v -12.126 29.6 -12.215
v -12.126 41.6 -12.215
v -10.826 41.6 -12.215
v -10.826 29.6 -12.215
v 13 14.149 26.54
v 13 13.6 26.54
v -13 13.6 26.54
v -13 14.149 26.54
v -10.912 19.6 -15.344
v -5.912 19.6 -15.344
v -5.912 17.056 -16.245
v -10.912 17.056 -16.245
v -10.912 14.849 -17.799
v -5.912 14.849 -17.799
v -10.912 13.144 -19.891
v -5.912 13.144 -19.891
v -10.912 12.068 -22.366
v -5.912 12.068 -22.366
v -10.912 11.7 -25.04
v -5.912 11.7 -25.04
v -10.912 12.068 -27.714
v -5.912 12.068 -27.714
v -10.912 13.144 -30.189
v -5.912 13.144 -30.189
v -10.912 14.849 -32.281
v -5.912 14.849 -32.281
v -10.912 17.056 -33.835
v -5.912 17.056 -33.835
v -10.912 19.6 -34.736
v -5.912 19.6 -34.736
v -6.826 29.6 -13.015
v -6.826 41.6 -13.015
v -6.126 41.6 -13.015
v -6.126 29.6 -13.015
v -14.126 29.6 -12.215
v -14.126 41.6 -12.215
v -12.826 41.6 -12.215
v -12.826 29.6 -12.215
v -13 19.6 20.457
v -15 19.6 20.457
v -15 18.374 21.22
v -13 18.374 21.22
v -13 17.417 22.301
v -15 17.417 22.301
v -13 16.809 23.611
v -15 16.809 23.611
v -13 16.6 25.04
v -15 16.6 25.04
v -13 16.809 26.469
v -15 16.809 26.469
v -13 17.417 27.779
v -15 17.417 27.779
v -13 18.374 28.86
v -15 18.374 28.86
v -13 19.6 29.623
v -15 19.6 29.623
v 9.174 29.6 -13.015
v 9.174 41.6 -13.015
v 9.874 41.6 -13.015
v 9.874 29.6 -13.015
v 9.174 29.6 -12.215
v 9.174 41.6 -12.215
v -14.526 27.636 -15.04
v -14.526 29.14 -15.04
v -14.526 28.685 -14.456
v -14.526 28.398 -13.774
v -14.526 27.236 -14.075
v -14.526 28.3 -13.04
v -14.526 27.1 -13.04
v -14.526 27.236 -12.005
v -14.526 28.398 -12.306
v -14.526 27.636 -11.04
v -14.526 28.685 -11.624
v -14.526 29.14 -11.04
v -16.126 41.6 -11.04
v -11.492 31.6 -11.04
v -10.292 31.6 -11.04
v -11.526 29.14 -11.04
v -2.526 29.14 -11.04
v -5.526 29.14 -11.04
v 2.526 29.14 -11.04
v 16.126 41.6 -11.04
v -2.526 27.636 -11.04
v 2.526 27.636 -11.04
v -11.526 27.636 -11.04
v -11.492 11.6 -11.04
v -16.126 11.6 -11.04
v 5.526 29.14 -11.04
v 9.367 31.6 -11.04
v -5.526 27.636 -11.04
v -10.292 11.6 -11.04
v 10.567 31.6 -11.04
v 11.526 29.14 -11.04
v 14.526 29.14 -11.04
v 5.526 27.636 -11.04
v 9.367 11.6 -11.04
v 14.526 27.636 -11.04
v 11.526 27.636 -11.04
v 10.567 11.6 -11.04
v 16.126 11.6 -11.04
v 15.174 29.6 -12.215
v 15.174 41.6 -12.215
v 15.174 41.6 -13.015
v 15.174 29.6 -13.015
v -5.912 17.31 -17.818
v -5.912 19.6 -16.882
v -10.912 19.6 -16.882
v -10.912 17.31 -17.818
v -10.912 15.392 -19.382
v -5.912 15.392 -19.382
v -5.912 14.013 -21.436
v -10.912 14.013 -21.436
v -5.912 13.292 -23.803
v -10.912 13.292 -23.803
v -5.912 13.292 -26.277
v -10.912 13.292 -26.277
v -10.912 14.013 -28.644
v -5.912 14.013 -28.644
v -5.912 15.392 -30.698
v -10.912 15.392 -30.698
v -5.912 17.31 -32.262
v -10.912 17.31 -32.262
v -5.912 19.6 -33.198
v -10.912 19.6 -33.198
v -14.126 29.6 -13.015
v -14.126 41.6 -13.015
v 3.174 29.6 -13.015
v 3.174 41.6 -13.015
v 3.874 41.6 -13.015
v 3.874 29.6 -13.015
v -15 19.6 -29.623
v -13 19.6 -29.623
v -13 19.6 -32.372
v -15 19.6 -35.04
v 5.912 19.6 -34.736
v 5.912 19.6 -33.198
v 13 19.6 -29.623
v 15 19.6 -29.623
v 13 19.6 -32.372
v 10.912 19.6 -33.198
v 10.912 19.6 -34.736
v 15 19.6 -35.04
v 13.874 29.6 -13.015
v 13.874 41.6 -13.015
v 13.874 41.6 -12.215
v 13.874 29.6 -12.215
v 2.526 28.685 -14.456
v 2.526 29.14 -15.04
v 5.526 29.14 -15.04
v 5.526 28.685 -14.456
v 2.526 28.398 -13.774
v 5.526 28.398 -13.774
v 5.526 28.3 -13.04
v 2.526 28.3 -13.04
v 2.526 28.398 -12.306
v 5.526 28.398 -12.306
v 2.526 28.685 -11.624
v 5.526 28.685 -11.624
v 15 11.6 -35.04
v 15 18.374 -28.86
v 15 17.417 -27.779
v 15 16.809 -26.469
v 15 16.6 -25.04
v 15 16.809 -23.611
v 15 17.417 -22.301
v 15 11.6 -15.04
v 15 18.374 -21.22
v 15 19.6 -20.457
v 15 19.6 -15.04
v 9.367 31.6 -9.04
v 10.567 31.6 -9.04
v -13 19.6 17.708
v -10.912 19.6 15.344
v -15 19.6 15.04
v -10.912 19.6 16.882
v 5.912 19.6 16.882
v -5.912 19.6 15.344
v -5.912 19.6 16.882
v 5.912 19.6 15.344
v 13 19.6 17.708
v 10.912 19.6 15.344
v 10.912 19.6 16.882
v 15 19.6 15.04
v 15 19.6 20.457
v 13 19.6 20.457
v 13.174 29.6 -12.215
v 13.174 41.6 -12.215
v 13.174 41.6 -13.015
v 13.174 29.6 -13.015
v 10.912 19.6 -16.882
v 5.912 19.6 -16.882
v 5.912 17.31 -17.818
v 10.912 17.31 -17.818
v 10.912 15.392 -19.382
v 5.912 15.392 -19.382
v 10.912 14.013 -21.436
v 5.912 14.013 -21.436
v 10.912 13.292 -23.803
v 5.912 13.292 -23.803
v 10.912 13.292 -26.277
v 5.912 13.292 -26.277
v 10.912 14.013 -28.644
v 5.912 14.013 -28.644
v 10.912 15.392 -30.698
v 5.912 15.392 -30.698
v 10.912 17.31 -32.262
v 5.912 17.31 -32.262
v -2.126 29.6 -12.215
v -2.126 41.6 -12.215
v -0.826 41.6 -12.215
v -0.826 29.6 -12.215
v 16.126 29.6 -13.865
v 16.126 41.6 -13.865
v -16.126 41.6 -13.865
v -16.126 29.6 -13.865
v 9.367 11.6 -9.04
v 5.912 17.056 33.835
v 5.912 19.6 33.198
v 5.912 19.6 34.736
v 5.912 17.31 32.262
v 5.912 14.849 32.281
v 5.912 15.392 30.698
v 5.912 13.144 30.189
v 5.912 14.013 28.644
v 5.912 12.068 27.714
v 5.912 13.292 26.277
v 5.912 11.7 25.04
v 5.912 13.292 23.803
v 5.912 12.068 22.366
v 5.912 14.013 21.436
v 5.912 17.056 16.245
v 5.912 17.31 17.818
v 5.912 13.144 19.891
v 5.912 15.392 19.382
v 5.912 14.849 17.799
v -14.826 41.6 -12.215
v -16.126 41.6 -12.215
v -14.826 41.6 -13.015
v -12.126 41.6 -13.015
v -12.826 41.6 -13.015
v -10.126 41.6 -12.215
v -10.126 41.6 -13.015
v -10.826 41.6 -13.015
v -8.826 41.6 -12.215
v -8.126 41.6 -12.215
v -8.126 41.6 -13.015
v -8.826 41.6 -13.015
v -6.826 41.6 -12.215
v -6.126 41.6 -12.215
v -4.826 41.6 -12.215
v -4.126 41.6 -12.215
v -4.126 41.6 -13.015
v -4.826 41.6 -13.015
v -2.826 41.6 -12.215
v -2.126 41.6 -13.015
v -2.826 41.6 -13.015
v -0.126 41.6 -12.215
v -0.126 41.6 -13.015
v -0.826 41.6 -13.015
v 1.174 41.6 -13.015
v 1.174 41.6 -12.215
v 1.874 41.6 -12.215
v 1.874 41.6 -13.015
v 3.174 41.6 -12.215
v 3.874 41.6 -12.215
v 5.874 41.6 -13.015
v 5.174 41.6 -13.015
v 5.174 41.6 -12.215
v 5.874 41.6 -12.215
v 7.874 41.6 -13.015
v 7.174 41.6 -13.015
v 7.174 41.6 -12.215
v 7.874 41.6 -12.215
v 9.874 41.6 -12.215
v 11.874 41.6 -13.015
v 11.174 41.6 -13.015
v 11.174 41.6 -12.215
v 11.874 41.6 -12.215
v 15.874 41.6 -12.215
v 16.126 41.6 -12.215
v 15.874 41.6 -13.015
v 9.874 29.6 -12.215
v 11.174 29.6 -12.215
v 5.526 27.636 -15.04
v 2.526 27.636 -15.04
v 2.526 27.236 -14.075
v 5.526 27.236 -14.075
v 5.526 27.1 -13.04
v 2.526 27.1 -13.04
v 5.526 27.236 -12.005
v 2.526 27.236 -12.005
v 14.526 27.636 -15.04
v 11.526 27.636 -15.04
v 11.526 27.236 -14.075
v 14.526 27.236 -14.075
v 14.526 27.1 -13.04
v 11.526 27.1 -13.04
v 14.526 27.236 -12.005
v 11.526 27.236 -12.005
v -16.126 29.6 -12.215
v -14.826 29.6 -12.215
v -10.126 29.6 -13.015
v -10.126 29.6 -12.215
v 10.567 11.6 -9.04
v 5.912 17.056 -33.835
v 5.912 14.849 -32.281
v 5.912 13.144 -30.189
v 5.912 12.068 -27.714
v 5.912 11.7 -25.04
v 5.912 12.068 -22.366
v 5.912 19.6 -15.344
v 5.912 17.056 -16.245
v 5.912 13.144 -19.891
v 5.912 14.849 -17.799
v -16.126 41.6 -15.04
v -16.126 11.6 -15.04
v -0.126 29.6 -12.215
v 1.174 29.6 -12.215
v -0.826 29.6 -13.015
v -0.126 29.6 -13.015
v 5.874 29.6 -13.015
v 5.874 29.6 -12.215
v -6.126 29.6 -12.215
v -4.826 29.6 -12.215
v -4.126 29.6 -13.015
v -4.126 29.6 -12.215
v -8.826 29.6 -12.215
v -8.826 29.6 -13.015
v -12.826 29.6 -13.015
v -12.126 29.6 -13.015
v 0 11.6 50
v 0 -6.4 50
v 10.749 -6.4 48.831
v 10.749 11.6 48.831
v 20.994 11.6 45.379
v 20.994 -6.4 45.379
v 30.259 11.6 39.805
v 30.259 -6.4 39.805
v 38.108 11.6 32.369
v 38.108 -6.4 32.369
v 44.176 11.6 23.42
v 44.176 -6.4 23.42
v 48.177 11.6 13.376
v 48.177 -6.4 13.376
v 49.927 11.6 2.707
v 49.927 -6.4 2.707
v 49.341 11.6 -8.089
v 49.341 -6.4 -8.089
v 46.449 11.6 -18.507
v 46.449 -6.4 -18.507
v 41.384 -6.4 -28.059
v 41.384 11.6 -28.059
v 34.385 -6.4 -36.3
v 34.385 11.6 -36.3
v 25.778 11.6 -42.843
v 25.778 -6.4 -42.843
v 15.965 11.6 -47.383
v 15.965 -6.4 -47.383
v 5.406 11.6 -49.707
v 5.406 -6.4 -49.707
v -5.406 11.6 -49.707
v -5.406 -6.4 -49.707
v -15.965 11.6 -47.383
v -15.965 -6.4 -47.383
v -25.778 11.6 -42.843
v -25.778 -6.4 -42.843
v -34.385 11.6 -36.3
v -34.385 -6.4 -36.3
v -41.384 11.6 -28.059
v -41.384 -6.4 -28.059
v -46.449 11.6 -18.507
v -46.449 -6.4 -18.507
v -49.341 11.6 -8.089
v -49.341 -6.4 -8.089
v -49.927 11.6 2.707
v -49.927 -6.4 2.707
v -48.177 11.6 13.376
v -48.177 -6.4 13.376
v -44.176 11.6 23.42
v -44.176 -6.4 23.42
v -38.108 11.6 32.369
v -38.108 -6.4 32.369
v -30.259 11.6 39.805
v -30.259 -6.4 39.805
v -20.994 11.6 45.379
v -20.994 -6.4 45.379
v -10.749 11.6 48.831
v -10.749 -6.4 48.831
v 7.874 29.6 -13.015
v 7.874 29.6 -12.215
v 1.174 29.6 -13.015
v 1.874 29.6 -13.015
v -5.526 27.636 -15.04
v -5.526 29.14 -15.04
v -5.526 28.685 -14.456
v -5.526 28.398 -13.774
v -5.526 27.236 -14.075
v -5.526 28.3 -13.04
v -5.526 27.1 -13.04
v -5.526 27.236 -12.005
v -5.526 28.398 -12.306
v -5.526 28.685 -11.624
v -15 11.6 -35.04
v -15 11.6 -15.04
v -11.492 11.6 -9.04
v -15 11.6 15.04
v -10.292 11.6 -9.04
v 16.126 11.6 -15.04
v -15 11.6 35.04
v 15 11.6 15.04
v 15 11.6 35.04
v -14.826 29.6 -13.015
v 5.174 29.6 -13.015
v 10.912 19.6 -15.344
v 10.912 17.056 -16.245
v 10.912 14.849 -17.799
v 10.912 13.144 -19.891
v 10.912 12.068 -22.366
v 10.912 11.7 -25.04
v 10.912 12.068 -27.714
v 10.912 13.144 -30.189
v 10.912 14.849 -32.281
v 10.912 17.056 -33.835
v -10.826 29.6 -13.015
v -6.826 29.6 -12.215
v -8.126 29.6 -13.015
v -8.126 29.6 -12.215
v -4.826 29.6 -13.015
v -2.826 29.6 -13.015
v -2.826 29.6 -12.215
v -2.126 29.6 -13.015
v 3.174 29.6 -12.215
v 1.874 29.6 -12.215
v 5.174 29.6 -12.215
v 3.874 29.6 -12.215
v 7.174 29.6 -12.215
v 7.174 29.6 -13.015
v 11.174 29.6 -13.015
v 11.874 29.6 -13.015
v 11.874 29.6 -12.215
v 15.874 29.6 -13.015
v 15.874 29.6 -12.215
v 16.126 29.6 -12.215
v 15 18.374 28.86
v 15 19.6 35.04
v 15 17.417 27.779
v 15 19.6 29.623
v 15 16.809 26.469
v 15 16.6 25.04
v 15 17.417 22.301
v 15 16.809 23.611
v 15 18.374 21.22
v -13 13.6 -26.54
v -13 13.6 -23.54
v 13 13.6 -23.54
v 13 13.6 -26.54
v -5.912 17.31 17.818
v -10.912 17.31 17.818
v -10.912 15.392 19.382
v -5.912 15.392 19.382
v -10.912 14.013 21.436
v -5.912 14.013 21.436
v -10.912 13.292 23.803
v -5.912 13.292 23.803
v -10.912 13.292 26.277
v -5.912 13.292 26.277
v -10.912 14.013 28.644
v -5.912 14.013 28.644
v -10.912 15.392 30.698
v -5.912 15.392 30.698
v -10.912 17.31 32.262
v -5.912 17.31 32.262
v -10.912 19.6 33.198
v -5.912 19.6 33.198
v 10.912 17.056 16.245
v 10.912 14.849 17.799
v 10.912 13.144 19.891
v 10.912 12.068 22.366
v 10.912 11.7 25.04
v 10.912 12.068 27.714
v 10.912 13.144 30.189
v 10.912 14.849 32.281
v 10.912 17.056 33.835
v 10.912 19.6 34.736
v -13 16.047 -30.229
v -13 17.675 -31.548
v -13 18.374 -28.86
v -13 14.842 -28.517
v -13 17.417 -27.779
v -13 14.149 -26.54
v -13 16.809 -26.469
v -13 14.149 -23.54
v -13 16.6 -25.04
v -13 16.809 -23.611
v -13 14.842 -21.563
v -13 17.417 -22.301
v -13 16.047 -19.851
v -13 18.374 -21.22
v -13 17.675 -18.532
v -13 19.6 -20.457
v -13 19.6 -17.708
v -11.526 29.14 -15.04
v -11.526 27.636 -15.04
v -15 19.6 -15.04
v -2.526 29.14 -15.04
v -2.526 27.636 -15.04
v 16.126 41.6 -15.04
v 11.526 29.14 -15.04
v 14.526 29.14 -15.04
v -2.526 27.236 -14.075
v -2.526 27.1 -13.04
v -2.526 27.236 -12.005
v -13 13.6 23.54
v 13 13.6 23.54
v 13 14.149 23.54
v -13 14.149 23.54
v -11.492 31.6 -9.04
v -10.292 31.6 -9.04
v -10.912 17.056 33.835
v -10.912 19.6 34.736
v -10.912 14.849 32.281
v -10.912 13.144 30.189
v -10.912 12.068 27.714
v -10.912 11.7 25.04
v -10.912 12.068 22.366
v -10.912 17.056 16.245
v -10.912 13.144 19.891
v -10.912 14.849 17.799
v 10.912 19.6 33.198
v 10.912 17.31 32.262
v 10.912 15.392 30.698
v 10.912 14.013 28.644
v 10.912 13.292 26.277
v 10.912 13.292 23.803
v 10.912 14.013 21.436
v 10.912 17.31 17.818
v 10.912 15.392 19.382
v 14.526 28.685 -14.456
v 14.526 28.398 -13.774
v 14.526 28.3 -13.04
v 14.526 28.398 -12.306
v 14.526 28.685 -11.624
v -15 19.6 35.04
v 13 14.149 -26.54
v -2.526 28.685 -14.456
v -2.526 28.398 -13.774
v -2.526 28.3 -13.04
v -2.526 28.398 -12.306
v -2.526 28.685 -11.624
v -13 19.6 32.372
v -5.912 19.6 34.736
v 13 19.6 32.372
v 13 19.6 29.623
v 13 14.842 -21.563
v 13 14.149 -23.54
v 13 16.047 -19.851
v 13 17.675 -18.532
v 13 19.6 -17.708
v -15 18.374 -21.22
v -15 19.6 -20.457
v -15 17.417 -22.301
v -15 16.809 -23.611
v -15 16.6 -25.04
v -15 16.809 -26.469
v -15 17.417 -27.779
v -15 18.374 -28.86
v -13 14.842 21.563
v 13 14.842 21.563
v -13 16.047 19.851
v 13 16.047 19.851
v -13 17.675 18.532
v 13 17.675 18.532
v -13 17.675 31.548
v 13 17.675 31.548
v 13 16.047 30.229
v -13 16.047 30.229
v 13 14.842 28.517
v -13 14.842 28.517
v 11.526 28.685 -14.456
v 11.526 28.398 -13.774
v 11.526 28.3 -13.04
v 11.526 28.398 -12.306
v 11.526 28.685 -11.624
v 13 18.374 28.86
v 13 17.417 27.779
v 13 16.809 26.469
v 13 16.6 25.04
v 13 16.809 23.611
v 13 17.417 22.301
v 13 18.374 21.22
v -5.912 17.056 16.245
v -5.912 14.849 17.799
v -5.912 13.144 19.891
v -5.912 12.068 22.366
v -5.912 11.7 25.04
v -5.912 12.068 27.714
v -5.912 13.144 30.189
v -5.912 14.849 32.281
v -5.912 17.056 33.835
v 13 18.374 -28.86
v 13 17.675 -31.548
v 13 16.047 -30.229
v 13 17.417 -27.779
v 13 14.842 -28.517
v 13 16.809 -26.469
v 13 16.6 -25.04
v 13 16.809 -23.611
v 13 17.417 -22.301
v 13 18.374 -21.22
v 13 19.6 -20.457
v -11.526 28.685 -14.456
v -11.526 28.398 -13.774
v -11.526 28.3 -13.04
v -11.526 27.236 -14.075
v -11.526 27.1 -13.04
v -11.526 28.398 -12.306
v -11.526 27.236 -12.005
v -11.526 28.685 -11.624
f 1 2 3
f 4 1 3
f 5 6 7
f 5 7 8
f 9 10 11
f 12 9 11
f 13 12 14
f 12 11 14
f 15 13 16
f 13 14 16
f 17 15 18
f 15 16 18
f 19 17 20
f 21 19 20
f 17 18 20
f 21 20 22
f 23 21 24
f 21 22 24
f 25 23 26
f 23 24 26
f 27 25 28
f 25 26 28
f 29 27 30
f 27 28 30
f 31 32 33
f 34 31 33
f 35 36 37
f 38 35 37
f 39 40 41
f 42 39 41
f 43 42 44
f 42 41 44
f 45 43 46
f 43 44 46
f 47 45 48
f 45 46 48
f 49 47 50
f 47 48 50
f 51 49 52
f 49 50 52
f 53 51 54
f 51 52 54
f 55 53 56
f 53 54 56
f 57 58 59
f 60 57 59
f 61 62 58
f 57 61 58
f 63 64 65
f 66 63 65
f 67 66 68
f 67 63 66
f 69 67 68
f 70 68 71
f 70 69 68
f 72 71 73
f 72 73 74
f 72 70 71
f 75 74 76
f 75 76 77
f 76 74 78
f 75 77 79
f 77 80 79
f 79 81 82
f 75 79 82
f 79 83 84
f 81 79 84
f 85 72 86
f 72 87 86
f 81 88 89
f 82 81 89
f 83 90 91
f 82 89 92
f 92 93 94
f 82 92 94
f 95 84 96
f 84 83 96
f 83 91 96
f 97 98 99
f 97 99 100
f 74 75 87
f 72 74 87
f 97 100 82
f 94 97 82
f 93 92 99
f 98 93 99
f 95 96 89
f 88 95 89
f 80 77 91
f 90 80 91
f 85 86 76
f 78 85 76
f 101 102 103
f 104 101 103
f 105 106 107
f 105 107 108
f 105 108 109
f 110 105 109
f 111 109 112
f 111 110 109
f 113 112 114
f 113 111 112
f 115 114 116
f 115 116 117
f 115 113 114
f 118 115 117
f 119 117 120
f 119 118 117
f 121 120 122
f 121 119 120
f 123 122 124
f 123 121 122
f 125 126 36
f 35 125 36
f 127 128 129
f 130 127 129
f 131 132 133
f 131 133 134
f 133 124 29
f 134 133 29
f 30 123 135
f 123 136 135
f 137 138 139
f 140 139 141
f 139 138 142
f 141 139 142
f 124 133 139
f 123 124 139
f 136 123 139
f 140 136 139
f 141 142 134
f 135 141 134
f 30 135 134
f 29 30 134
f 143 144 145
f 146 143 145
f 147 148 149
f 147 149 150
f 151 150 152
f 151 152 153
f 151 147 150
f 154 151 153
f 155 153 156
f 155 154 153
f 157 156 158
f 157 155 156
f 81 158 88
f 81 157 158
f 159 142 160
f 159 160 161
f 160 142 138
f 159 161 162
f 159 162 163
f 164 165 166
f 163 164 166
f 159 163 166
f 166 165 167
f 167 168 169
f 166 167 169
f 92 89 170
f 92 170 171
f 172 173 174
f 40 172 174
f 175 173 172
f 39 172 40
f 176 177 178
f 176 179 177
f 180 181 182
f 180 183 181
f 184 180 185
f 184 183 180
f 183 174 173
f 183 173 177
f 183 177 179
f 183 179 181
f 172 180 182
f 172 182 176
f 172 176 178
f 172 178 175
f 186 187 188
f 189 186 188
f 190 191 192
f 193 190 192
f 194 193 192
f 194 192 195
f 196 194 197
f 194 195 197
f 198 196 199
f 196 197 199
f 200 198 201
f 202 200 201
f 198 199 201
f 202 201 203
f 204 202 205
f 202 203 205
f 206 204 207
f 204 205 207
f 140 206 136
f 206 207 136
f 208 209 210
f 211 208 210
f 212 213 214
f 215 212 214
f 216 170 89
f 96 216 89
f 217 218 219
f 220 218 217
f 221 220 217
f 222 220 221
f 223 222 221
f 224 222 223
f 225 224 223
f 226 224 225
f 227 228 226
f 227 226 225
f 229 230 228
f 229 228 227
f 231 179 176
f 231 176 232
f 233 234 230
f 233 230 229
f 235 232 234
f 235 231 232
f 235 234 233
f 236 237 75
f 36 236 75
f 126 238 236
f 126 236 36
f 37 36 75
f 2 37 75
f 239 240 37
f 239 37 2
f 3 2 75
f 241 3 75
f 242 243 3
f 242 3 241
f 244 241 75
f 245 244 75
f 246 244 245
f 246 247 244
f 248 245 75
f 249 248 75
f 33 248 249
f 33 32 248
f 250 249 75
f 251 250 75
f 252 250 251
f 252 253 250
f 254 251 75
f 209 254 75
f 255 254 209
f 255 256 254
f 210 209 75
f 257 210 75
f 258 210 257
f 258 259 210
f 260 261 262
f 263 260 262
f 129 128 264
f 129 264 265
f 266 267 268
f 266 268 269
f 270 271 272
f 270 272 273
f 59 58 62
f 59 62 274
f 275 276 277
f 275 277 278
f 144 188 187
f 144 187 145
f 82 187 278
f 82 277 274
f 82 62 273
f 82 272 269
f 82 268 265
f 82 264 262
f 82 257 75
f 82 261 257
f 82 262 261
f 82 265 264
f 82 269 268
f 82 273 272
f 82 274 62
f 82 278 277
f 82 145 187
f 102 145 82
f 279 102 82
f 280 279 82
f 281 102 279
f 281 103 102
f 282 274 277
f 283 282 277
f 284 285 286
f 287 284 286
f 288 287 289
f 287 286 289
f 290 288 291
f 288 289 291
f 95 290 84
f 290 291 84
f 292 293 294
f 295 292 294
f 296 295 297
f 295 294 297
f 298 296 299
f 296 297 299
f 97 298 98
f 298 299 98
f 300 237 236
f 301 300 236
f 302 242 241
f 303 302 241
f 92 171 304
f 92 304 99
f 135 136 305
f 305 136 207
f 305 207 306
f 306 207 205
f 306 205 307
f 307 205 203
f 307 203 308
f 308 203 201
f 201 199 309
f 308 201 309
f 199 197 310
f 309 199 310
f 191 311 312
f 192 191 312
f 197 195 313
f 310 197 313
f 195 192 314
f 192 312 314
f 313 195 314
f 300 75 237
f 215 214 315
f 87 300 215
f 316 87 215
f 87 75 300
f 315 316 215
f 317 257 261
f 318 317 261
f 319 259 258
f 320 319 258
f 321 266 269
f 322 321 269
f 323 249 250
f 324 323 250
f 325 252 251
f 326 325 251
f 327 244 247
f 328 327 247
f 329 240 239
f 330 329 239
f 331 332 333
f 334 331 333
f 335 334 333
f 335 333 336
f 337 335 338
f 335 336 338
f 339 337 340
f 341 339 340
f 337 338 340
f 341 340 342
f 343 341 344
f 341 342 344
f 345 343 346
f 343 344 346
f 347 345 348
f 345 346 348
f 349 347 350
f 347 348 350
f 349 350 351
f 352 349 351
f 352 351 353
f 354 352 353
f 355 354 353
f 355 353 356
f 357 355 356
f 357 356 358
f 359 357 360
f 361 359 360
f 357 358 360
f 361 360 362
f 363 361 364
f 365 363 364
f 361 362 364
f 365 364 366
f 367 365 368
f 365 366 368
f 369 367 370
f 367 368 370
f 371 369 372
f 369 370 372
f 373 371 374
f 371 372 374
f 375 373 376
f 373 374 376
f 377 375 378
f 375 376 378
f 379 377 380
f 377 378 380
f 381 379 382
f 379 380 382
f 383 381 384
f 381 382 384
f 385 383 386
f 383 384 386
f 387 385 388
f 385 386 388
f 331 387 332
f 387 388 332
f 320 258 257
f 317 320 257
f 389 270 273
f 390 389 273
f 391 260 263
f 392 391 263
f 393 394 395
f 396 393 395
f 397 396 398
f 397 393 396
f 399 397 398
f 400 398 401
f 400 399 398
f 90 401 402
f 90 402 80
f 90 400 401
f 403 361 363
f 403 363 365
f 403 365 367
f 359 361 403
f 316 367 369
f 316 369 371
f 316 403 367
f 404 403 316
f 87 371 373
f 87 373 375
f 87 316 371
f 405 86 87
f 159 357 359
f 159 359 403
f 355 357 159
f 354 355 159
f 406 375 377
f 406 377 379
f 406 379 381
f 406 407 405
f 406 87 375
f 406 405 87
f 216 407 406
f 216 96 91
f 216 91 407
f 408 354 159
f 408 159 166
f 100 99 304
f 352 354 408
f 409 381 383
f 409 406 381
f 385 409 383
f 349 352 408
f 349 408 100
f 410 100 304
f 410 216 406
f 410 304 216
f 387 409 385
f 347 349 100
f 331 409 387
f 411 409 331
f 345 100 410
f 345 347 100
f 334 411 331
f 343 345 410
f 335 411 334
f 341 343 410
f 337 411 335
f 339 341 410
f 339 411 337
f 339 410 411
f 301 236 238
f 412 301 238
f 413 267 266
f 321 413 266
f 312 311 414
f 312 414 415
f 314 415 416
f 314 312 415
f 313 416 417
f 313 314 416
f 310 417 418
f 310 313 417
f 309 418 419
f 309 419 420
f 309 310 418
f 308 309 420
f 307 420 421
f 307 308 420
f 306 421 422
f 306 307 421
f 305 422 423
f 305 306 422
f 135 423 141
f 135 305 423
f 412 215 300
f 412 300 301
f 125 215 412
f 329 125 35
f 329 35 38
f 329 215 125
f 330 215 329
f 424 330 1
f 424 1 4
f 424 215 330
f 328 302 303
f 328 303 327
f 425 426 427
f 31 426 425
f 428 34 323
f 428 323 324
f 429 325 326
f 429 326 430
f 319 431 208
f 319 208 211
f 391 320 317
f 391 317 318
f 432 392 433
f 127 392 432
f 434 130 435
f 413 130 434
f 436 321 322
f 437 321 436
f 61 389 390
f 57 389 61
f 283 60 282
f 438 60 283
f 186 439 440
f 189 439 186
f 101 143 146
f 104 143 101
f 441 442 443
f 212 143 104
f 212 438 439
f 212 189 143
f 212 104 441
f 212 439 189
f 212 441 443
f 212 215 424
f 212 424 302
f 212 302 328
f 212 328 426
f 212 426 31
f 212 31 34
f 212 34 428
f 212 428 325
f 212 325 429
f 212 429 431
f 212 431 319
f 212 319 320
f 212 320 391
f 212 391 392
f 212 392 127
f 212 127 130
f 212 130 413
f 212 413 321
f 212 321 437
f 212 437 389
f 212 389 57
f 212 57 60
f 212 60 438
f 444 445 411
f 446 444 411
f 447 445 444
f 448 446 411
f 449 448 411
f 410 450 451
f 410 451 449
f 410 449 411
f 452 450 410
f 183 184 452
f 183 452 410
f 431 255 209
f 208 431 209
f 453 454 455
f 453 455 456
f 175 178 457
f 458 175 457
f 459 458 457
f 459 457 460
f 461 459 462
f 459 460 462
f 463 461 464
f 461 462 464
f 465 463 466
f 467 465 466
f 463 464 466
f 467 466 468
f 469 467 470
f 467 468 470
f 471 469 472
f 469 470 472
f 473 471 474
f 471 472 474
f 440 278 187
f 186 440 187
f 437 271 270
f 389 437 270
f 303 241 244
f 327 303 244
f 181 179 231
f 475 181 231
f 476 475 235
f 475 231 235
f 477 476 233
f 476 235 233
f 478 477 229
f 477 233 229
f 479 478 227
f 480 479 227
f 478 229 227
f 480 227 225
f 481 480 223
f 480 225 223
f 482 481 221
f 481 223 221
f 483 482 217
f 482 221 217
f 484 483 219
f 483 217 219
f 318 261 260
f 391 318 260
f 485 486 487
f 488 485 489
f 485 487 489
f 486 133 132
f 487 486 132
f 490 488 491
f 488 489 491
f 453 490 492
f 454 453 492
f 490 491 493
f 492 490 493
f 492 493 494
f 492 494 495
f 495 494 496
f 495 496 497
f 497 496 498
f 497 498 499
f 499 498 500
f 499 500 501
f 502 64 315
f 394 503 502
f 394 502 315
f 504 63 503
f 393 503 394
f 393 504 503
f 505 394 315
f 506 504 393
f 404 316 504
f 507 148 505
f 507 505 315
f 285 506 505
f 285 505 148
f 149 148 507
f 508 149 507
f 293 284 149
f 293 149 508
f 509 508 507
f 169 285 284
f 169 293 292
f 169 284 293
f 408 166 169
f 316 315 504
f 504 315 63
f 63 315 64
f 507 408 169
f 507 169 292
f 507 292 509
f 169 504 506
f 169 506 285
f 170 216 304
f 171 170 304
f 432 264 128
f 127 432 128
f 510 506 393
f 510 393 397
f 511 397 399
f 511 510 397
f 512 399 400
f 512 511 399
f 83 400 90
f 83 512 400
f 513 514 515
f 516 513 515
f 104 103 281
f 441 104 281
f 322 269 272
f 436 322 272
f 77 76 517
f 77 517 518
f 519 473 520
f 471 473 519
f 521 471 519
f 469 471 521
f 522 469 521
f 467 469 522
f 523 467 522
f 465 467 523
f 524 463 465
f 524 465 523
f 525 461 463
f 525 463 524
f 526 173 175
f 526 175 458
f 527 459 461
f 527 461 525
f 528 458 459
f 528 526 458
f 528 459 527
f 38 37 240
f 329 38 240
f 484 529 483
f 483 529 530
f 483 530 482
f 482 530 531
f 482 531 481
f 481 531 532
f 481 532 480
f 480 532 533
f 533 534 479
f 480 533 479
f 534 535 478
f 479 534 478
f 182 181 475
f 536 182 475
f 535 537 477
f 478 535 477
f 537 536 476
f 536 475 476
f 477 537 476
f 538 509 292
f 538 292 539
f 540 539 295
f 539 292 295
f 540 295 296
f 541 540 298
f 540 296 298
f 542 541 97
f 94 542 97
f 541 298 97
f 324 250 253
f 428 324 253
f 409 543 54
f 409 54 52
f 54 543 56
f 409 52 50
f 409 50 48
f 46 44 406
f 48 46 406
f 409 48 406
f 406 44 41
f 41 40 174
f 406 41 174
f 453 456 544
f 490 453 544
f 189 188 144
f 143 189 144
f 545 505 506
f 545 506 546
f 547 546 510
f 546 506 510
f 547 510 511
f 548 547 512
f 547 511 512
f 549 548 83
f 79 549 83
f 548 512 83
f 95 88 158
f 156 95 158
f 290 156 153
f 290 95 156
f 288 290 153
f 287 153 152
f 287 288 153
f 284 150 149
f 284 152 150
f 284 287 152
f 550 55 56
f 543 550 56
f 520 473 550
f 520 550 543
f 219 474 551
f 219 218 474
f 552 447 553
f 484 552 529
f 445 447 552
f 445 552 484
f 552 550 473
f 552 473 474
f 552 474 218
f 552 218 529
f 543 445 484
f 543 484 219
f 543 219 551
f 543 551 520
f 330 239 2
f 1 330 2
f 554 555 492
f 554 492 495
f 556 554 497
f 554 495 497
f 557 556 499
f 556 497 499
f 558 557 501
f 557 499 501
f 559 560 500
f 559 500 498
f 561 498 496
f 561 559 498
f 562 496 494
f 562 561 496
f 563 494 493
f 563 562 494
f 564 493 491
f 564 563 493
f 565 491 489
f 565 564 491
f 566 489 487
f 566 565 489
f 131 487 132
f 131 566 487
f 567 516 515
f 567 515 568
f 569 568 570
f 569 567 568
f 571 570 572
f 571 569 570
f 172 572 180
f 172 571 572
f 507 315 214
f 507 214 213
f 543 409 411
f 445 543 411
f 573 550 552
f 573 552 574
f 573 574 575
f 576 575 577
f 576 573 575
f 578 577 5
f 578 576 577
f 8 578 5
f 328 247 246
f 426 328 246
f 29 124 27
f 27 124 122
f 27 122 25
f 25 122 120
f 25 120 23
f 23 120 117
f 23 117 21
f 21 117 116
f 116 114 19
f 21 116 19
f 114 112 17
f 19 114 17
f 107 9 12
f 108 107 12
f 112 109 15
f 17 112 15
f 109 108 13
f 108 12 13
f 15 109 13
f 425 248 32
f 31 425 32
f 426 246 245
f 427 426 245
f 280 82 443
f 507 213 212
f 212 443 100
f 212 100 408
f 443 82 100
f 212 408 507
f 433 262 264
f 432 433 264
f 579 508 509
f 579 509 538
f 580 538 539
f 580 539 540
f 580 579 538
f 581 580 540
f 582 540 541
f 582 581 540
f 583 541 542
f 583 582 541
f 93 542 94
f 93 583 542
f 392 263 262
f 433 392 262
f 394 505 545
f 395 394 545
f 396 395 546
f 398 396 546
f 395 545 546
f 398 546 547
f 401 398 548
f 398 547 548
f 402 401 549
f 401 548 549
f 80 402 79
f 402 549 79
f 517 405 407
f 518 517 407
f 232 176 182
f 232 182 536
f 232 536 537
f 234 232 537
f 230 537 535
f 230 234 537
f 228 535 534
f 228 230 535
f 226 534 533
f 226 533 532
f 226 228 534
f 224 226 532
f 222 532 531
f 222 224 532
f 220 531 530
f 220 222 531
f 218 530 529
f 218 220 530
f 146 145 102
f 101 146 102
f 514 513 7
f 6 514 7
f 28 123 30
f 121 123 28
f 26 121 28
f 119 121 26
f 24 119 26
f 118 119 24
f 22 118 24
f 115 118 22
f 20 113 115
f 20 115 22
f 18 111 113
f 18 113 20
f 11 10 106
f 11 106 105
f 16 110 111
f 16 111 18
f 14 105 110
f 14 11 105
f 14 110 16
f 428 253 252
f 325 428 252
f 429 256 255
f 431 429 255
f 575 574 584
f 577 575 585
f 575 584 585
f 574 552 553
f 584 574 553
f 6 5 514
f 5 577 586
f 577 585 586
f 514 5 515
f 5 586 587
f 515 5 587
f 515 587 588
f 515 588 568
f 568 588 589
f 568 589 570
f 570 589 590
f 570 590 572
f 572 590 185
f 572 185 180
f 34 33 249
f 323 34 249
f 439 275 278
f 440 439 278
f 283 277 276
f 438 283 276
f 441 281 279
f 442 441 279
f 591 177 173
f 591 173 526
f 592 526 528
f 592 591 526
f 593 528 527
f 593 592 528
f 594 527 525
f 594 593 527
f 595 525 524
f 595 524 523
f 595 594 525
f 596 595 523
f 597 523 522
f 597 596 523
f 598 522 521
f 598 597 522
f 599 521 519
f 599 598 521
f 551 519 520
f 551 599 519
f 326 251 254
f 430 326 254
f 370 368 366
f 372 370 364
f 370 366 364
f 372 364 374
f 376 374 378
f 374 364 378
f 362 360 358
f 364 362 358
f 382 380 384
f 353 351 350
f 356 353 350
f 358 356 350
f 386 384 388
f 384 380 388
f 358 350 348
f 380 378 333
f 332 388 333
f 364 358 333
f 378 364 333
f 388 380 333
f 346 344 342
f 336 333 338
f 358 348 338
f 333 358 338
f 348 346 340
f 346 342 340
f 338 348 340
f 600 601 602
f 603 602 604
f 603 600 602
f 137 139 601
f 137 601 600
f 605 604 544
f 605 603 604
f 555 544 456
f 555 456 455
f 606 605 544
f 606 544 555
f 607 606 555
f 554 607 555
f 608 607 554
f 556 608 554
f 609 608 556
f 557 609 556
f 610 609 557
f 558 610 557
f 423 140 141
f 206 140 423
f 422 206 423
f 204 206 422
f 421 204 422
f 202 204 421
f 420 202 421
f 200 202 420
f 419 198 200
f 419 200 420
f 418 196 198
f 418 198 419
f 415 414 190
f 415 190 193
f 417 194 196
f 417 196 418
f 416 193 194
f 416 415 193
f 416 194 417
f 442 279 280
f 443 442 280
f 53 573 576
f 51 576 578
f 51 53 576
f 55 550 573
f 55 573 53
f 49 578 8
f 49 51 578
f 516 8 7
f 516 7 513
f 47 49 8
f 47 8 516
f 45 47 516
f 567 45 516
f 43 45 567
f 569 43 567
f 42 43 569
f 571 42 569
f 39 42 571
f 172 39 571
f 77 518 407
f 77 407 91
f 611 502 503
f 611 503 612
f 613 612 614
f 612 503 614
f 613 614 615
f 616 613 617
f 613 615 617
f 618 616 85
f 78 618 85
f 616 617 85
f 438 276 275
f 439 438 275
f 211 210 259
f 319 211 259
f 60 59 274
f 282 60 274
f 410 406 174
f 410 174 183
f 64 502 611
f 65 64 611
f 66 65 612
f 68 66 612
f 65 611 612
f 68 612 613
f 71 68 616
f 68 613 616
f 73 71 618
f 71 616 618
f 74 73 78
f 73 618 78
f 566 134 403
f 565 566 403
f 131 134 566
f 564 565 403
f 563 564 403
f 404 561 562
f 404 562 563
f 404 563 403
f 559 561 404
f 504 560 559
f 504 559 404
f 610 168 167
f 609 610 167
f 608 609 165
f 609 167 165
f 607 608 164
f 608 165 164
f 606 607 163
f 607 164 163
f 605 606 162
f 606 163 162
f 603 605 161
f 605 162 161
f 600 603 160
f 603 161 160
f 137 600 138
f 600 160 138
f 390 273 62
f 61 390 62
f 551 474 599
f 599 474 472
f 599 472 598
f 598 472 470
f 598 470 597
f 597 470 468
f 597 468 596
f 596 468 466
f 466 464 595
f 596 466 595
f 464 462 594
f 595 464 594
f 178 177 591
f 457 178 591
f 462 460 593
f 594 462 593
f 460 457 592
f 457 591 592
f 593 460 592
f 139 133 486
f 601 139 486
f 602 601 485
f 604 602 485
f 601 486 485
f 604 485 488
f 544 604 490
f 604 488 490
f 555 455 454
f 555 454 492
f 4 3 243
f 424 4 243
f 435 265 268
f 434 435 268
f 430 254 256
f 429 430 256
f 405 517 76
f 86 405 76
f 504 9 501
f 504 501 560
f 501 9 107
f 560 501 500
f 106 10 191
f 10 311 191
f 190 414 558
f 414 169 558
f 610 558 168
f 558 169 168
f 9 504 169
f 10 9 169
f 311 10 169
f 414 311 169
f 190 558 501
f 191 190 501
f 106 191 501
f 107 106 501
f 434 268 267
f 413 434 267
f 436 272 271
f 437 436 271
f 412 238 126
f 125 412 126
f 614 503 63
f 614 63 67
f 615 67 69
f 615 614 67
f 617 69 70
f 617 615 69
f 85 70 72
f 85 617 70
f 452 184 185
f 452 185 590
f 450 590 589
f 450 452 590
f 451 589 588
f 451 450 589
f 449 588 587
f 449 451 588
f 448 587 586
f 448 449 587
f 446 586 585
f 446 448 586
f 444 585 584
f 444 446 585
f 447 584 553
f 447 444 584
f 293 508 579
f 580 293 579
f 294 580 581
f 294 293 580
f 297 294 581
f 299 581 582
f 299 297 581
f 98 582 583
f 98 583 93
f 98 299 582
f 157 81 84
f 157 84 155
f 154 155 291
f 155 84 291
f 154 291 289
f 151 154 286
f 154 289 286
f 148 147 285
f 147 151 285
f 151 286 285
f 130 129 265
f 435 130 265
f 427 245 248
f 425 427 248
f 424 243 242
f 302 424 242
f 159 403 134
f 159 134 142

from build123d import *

# Parameters (mm, degrees)
AUFSATZ_LINEAR_AUSTRAGEN1_DEPTH      = 1.6
AUFSATZ_LINEAR_AUSTRAGEN1_DEPTH_BACK = 16.4
SKIZZE1_R                            = 50
SKIZZE2_W                            = 30
SKIZZE2_H                            = 20
AUFSATZ_LINEAR_AUSTRAGEN2_DEPTH      = 8
SKIZZE4_R                            = 7.6
SCHNITT_LINEAR_AUSTRAGEN1_DEPTH      = 85.315834812
AUFSATZ_LINEAR_AUSTRAGEN3_DEPTH      = 2
SKIZZE7_W                            = 3
SKIZZE7_H                            = 0.8
SCHNITT_LINEAR_AUSTRAGEN2_DEPTH      = 13
SKIZZE6_W                            = 5
SKIZZE6_H                            = 1.5
SPIEGELN3_COPY_1_DEPTH               = 2
SPIEGELN3_COPY_2_SKETCH_W            = 5
SPIEGELN3_COPY_2_SKETCH_H            = 1.5
SKIZZE9_W                            = 32.252572888
SKIZZE9_H                            = 4
AUFSATZ_LINEAR_AUSTRAGEN4_DEPTH      = 30
SCHNITT_LINEAR_AUSTRAGEN3_DEPTH      = 12
SKIZZE11_W                           = 1.2
SKIZZE11_H                           = 2
AUFSATZ_LINEAR_AUSTRAGEN5_DEPTH      = 20
SKIZZE13_W                           = 3
SKIZZE13_H                           = 1.2
SCHNITT_ROTATION3_ANGLE              = 180
LINEARES_MUSTER1_COUNT               = 2
LINEARES_MUSTER1_PITCH               = 9
SPIEGELN4_COPY_1_SKETCH_W            = 3
SPIEGELN4_COPY_1_SKETCH_H            = 1.2
SPIEGELN4_COPY_1_ANGLE               = 180


with BuildPart() as part:
    # Skizze1 → Aufsatz-Linear austragen1 (new, two sides: drawn at the far end of the back side and taken through both)
    with BuildSketch(Plane(origin=(0, 10, 0), x_dir=(1, 0, 0), z_dir=(0, 1, 0)).offset(-AUFSATZ_LINEAR_AUSTRAGEN1_DEPTH_BACK)):
        with Locations(Location((0, 0, 0), (0, 0, 270))):
            Circle(SKIZZE1_R)
    extrude(amount=AUFSATZ_LINEAR_AUSTRAGEN1_DEPTH + AUFSATZ_LINEAR_AUSTRAGEN1_DEPTH_BACK)

    # Skizze2 → Aufsatz-Linear austragen2 (add)
    with BuildSketch(Plane(origin=(0, 11.6, 0), x_dir=(1, 0, 0), z_dir=(0, 1, 0))):
        with Locations((0, 25.04)):
            Rectangle(SKIZZE2_W, SKIZZE2_H)
    aufsatz_linear_austragen2 = extrude(amount=AUFSATZ_LINEAR_AUSTRAGEN2_DEPTH)

    # Skizze4 → Schnitt-Linear austragen1 (cut, through all)
    with BuildSketch(Plane.ZY.offset(15)):
        with Locations((-25.04, 21.6)):
            Circle(SKIZZE4_R)
    schnitt_linear_austragen1 = extrude(amount=-SCHNITT_LINEAR_AUSTRAGEN1_DEPTH, mode=Mode.SUBTRACT)

    # Skizze5 → Aufsatz-Linear austragen3 (add)
    with BuildSketch(Plane.ZY.offset(15)):
        with BuildLine():
            Line((-29.622575695, 19.6), (-32.372121112, 19.6))
            ThreePointArc((-32.372121112, 19.6), (-25.04, 14), (-17.707878888, 19.6))
            Line((-17.707878888, 19.6), (-20.457424305, 19.6))
            ThreePointArc((-20.457424305, 19.6), (-25.04, 16.6), (-29.622575695, 19.6))
        make_face()
    aufsatz_linear_austragen3 = extrude(amount=-AUFSATZ_LINEAR_AUSTRAGEN3_DEPTH)

    # Spiegeln1: Aufsatz-Linear austragen3 across plane
    add(aufsatz_linear_austragen3.mirror(Plane(origin=(0, 0, 0), x_dir=(0, 0, 1), z_dir=(1, 0, 0))))

    # Skizze7 → Schnitt-Linear austragen2 (cut, symmetric)
    with BuildSketch(Plane(origin=(0, 0, 0), x_dir=(0, 0, -1), z_dir=(1, 0, 0))):
        with Locations((25.04, 14)):
            Rectangle(SKIZZE7_W, SKIZZE7_H)
    schnitt_linear_austragen2 = extrude(amount=SCHNITT_LINEAR_AUSTRAGEN2_DEPTH, both=True, mode=Mode.SUBTRACT)

    # Skizze6 → Schnitt-Rotation2 (revolve, cut)
    with BuildSketch(Plane.XY.offset(-25.04)):
        with Locations((-8.412172741, 30.75)):
            Rectangle(SKIZZE6_W, SKIZZE6_H)
    schnitt_rotation2 = revolve(axis=Axis((-15, 21.6, -25.04), (1, 0, 0)), mode=Mode.SUBTRACT)

    # Spiegeln2: Schnitt-Rotation2 across plane
    add(schnitt_rotation2.mirror(Plane(origin=(0, 0, 0), x_dir=(0, 0, 1), z_dir=(1, 0, 0))), mode=Mode.SUBTRACT)

    # Spiegeln3: Aufsatz-Linear austragen2, Schnitt-Linear austragen1, Aufsatz-Linear austragen3, Schnitt-Linear austragen2, Schnitt-Rotation2 across plane
    add(aufsatz_linear_austragen2.mirror(Plane.XY))
    add(schnitt_linear_austragen1.mirror(Plane.XY), mode=Mode.SUBTRACT)
    add(aufsatz_linear_austragen3.mirror(Plane.XY))
    add(schnitt_linear_austragen2.mirror(Plane.XY), mode=Mode.SUBTRACT)
    add(schnitt_rotation2.mirror(Plane.XY), mode=Mode.SUBTRACT)

    # Spiegeln3 copy 1 sketch → Spiegeln3 copy 1 (add)
    with BuildSketch(Plane(origin=(15, 0, 0), x_dir=(0, 0, -1), z_dir=(1, 0, 0))):
        with BuildLine():
            Line((-29.622575695, 19.6), (-32.372121112, 19.6))
            ThreePointArc((-32.372121112, 19.6), (-25.04, 14), (-17.707878888, 19.6))
            Line((-17.707878888, 19.6), (-20.457424305, 19.6))
            ThreePointArc((-20.457424305, 19.6), (-25.04, 16.6), (-29.622575695, 19.6))
        make_face()
    extrude(amount=-SPIEGELN3_COPY_1_DEPTH)

    # Spiegeln3 copy 2 sketch → Spiegeln3 copy 2 (revolve, cut)
    with BuildSketch(Plane(origin=(0, 0, 25.04), x_dir=(-1, 0, 0), z_dir=(0, 0, -1))):
        with Locations((-8.412172741, 30.75)):
            Rectangle(SPIEGELN3_COPY_2_SKETCH_W, SPIEGELN3_COPY_2_SKETCH_H)
    revolve(axis=Axis((15, 21.6, 25.04), (-1, 0, 0)), mode=Mode.SUBTRACT)

    # Skizze9 → Aufsatz-Linear austragen4 (add)
    with BuildSketch(Plane(origin=(0, 11.6, 0), x_dir=(1, 0, 0), z_dir=(0, 1, 0))):
        with Locations((0, 13.04)):
            Rectangle(SKIZZE9_W, SKIZZE9_H)
    extrude(amount=AUFSATZ_LINEAR_AUSTRAGEN4_DEPTH)

    # Skizze10 → Schnitt-Linear austragen3 (cut)
    with BuildSketch(Plane(origin=(0, 41.6, 0), x_dir=(1, 0, 0), z_dir=(0, 1, 0))):
        Polygon((-16.126286444, 12.215), (-14.826286444, 12.215), (-14.826286444, 13.015), (-14.126286444, 13.015), (-14.126286444, 12.215), (-12.826286444, 12.215), (-12.826286444, 13.015), (-12.126286444, 13.015), (-12.126286444, 12.215), (-10.826286444, 12.215), (-10.826286444, 13.015), (-10.126286444, 13.015), (-10.126286444, 12.215), (-8.826286444, 12.215), (-8.826286444, 13.015), (-8.126286444, 13.015), (-8.126286444, 12.215), (-6.826286444, 12.215), (-6.826286444, 13.015), (-6.126286444, 13.015), (-6.126286444, 12.215), (-4.826286444, 12.215), (-4.826286444, 13.015), (-4.126286444, 13.015), (-4.126286444, 12.215), (-2.826286444, 12.215), (-2.826286444, 13.015), (-2.126286444, 13.015), (-2.126286444, 12.215), (-0.826286444, 12.215), (-0.826286444, 13.015), (-0.126286444, 13.015), (-0.126286444, 12.215), (1.173713556, 12.215), (1.173713556, 13.015), (1.873713556, 13.015), (1.873713556, 12.215), (3.173713556, 12.215), (3.173713556, 13.015), (3.873713556, 13.015), (3.873713556, 12.215), (5.173713556, 12.215), (5.173713556, 13.015), (5.873713556, 13.015), (5.873713556, 12.215), (7.173713556, 12.215), (7.173713556, 13.015), (7.873713556, 13.015), (7.873713556, 12.215), (9.173713556, 12.215), (9.173713556, 13.015), (9.873713556, 13.015), (9.873713556, 12.215), (11.173713556, 12.215), (11.173713556, 13.015), (11.873713556, 13.015), (11.873713556, 12.215), (13.173713556, 12.215), (13.173713556, 13.015), (13.873713556, 13.015), (13.873713556, 12.215), (15.173713556, 12.215), (15.173713556, 13.015), (15.873713556, 13.015), (15.873713556, 12.215), (17.173713556, 12.215), (17.173713556, 13.865), (-16.126286444, 13.865), (-16.126286444, 13.065), align=None)
    extrude(amount=-SCHNITT_LINEAR_AUSTRAGEN3_DEPTH, mode=Mode.SUBTRACT)

    # Skizze11 → Aufsatz-Linear austragen5 (add)
    with BuildSketch(Plane(origin=(0, 11.6, 0), x_dir=(1, 0, 0), z_dir=(0, 1, 0))):
        with Locations((-10.891559468, 10.04)):
            Rectangle(SKIZZE11_W, SKIZZE11_H)
        with Locations((9.966595777, 10.04)):
            Rectangle(SKIZZE11_W, SKIZZE11_H)
    extrude(amount=AUFSATZ_LINEAR_AUSTRAGEN5_DEPTH)

    # Skizze13 → Schnitt-Rotation3 (revolve, cut)
    with BuildSketch(Plane(origin=(0, 31.1, 0), x_dir=(1, 0, 0), z_dir=(0, 1, 0))):
        with Locations((-13.026286444, 16.44)):
            Rectangle(SKIZZE13_W, SKIZZE13_H)
    schnitt_rotation3 = revolve(axis=Axis((-16.126286444, 31.1, -13.04), (-1, 0, 0)), revolution_arc=SCHNITT_ROTATION3_ANGLE, mode=Mode.SUBTRACT)

    # Lineares Muster1: Schnitt-Rotation3 ×2
    with Locations(*[(i * LINEARES_MUSTER1_PITCH, 0, 0) for i in range(1, LINEARES_MUSTER1_COUNT)]):
        add(schnitt_rotation3, mode=Mode.SUBTRACT)

    # Spiegeln4: Schnitt-Rotation3 across plane
    add(schnitt_rotation3.mirror(Plane(origin=(0, 0, 0), x_dir=(0, 0, 1), z_dir=(1, 0, 0))), mode=Mode.SUBTRACT)

    # Spiegeln4 copy 1 sketch → Spiegeln4 copy 1 (revolve, cut)
    with BuildSketch(Plane(origin=(-9, 31.1, 0), x_dir=(-1, 0, 0), z_dir=(0, 1, 0))):
        with Locations((-13.026286444, -16.44)):
            Rectangle(SPIEGELN4_COPY_1_SKETCH_W, SPIEGELN4_COPY_1_SKETCH_H)
    revolve(axis=Axis((7.126286444, 31.1, -13.04), (-1, 0, 0)), revolution_arc=SPIEGELN4_COPY_1_ANGLE, mode=Mode.SUBTRACT)


solid = part.part
